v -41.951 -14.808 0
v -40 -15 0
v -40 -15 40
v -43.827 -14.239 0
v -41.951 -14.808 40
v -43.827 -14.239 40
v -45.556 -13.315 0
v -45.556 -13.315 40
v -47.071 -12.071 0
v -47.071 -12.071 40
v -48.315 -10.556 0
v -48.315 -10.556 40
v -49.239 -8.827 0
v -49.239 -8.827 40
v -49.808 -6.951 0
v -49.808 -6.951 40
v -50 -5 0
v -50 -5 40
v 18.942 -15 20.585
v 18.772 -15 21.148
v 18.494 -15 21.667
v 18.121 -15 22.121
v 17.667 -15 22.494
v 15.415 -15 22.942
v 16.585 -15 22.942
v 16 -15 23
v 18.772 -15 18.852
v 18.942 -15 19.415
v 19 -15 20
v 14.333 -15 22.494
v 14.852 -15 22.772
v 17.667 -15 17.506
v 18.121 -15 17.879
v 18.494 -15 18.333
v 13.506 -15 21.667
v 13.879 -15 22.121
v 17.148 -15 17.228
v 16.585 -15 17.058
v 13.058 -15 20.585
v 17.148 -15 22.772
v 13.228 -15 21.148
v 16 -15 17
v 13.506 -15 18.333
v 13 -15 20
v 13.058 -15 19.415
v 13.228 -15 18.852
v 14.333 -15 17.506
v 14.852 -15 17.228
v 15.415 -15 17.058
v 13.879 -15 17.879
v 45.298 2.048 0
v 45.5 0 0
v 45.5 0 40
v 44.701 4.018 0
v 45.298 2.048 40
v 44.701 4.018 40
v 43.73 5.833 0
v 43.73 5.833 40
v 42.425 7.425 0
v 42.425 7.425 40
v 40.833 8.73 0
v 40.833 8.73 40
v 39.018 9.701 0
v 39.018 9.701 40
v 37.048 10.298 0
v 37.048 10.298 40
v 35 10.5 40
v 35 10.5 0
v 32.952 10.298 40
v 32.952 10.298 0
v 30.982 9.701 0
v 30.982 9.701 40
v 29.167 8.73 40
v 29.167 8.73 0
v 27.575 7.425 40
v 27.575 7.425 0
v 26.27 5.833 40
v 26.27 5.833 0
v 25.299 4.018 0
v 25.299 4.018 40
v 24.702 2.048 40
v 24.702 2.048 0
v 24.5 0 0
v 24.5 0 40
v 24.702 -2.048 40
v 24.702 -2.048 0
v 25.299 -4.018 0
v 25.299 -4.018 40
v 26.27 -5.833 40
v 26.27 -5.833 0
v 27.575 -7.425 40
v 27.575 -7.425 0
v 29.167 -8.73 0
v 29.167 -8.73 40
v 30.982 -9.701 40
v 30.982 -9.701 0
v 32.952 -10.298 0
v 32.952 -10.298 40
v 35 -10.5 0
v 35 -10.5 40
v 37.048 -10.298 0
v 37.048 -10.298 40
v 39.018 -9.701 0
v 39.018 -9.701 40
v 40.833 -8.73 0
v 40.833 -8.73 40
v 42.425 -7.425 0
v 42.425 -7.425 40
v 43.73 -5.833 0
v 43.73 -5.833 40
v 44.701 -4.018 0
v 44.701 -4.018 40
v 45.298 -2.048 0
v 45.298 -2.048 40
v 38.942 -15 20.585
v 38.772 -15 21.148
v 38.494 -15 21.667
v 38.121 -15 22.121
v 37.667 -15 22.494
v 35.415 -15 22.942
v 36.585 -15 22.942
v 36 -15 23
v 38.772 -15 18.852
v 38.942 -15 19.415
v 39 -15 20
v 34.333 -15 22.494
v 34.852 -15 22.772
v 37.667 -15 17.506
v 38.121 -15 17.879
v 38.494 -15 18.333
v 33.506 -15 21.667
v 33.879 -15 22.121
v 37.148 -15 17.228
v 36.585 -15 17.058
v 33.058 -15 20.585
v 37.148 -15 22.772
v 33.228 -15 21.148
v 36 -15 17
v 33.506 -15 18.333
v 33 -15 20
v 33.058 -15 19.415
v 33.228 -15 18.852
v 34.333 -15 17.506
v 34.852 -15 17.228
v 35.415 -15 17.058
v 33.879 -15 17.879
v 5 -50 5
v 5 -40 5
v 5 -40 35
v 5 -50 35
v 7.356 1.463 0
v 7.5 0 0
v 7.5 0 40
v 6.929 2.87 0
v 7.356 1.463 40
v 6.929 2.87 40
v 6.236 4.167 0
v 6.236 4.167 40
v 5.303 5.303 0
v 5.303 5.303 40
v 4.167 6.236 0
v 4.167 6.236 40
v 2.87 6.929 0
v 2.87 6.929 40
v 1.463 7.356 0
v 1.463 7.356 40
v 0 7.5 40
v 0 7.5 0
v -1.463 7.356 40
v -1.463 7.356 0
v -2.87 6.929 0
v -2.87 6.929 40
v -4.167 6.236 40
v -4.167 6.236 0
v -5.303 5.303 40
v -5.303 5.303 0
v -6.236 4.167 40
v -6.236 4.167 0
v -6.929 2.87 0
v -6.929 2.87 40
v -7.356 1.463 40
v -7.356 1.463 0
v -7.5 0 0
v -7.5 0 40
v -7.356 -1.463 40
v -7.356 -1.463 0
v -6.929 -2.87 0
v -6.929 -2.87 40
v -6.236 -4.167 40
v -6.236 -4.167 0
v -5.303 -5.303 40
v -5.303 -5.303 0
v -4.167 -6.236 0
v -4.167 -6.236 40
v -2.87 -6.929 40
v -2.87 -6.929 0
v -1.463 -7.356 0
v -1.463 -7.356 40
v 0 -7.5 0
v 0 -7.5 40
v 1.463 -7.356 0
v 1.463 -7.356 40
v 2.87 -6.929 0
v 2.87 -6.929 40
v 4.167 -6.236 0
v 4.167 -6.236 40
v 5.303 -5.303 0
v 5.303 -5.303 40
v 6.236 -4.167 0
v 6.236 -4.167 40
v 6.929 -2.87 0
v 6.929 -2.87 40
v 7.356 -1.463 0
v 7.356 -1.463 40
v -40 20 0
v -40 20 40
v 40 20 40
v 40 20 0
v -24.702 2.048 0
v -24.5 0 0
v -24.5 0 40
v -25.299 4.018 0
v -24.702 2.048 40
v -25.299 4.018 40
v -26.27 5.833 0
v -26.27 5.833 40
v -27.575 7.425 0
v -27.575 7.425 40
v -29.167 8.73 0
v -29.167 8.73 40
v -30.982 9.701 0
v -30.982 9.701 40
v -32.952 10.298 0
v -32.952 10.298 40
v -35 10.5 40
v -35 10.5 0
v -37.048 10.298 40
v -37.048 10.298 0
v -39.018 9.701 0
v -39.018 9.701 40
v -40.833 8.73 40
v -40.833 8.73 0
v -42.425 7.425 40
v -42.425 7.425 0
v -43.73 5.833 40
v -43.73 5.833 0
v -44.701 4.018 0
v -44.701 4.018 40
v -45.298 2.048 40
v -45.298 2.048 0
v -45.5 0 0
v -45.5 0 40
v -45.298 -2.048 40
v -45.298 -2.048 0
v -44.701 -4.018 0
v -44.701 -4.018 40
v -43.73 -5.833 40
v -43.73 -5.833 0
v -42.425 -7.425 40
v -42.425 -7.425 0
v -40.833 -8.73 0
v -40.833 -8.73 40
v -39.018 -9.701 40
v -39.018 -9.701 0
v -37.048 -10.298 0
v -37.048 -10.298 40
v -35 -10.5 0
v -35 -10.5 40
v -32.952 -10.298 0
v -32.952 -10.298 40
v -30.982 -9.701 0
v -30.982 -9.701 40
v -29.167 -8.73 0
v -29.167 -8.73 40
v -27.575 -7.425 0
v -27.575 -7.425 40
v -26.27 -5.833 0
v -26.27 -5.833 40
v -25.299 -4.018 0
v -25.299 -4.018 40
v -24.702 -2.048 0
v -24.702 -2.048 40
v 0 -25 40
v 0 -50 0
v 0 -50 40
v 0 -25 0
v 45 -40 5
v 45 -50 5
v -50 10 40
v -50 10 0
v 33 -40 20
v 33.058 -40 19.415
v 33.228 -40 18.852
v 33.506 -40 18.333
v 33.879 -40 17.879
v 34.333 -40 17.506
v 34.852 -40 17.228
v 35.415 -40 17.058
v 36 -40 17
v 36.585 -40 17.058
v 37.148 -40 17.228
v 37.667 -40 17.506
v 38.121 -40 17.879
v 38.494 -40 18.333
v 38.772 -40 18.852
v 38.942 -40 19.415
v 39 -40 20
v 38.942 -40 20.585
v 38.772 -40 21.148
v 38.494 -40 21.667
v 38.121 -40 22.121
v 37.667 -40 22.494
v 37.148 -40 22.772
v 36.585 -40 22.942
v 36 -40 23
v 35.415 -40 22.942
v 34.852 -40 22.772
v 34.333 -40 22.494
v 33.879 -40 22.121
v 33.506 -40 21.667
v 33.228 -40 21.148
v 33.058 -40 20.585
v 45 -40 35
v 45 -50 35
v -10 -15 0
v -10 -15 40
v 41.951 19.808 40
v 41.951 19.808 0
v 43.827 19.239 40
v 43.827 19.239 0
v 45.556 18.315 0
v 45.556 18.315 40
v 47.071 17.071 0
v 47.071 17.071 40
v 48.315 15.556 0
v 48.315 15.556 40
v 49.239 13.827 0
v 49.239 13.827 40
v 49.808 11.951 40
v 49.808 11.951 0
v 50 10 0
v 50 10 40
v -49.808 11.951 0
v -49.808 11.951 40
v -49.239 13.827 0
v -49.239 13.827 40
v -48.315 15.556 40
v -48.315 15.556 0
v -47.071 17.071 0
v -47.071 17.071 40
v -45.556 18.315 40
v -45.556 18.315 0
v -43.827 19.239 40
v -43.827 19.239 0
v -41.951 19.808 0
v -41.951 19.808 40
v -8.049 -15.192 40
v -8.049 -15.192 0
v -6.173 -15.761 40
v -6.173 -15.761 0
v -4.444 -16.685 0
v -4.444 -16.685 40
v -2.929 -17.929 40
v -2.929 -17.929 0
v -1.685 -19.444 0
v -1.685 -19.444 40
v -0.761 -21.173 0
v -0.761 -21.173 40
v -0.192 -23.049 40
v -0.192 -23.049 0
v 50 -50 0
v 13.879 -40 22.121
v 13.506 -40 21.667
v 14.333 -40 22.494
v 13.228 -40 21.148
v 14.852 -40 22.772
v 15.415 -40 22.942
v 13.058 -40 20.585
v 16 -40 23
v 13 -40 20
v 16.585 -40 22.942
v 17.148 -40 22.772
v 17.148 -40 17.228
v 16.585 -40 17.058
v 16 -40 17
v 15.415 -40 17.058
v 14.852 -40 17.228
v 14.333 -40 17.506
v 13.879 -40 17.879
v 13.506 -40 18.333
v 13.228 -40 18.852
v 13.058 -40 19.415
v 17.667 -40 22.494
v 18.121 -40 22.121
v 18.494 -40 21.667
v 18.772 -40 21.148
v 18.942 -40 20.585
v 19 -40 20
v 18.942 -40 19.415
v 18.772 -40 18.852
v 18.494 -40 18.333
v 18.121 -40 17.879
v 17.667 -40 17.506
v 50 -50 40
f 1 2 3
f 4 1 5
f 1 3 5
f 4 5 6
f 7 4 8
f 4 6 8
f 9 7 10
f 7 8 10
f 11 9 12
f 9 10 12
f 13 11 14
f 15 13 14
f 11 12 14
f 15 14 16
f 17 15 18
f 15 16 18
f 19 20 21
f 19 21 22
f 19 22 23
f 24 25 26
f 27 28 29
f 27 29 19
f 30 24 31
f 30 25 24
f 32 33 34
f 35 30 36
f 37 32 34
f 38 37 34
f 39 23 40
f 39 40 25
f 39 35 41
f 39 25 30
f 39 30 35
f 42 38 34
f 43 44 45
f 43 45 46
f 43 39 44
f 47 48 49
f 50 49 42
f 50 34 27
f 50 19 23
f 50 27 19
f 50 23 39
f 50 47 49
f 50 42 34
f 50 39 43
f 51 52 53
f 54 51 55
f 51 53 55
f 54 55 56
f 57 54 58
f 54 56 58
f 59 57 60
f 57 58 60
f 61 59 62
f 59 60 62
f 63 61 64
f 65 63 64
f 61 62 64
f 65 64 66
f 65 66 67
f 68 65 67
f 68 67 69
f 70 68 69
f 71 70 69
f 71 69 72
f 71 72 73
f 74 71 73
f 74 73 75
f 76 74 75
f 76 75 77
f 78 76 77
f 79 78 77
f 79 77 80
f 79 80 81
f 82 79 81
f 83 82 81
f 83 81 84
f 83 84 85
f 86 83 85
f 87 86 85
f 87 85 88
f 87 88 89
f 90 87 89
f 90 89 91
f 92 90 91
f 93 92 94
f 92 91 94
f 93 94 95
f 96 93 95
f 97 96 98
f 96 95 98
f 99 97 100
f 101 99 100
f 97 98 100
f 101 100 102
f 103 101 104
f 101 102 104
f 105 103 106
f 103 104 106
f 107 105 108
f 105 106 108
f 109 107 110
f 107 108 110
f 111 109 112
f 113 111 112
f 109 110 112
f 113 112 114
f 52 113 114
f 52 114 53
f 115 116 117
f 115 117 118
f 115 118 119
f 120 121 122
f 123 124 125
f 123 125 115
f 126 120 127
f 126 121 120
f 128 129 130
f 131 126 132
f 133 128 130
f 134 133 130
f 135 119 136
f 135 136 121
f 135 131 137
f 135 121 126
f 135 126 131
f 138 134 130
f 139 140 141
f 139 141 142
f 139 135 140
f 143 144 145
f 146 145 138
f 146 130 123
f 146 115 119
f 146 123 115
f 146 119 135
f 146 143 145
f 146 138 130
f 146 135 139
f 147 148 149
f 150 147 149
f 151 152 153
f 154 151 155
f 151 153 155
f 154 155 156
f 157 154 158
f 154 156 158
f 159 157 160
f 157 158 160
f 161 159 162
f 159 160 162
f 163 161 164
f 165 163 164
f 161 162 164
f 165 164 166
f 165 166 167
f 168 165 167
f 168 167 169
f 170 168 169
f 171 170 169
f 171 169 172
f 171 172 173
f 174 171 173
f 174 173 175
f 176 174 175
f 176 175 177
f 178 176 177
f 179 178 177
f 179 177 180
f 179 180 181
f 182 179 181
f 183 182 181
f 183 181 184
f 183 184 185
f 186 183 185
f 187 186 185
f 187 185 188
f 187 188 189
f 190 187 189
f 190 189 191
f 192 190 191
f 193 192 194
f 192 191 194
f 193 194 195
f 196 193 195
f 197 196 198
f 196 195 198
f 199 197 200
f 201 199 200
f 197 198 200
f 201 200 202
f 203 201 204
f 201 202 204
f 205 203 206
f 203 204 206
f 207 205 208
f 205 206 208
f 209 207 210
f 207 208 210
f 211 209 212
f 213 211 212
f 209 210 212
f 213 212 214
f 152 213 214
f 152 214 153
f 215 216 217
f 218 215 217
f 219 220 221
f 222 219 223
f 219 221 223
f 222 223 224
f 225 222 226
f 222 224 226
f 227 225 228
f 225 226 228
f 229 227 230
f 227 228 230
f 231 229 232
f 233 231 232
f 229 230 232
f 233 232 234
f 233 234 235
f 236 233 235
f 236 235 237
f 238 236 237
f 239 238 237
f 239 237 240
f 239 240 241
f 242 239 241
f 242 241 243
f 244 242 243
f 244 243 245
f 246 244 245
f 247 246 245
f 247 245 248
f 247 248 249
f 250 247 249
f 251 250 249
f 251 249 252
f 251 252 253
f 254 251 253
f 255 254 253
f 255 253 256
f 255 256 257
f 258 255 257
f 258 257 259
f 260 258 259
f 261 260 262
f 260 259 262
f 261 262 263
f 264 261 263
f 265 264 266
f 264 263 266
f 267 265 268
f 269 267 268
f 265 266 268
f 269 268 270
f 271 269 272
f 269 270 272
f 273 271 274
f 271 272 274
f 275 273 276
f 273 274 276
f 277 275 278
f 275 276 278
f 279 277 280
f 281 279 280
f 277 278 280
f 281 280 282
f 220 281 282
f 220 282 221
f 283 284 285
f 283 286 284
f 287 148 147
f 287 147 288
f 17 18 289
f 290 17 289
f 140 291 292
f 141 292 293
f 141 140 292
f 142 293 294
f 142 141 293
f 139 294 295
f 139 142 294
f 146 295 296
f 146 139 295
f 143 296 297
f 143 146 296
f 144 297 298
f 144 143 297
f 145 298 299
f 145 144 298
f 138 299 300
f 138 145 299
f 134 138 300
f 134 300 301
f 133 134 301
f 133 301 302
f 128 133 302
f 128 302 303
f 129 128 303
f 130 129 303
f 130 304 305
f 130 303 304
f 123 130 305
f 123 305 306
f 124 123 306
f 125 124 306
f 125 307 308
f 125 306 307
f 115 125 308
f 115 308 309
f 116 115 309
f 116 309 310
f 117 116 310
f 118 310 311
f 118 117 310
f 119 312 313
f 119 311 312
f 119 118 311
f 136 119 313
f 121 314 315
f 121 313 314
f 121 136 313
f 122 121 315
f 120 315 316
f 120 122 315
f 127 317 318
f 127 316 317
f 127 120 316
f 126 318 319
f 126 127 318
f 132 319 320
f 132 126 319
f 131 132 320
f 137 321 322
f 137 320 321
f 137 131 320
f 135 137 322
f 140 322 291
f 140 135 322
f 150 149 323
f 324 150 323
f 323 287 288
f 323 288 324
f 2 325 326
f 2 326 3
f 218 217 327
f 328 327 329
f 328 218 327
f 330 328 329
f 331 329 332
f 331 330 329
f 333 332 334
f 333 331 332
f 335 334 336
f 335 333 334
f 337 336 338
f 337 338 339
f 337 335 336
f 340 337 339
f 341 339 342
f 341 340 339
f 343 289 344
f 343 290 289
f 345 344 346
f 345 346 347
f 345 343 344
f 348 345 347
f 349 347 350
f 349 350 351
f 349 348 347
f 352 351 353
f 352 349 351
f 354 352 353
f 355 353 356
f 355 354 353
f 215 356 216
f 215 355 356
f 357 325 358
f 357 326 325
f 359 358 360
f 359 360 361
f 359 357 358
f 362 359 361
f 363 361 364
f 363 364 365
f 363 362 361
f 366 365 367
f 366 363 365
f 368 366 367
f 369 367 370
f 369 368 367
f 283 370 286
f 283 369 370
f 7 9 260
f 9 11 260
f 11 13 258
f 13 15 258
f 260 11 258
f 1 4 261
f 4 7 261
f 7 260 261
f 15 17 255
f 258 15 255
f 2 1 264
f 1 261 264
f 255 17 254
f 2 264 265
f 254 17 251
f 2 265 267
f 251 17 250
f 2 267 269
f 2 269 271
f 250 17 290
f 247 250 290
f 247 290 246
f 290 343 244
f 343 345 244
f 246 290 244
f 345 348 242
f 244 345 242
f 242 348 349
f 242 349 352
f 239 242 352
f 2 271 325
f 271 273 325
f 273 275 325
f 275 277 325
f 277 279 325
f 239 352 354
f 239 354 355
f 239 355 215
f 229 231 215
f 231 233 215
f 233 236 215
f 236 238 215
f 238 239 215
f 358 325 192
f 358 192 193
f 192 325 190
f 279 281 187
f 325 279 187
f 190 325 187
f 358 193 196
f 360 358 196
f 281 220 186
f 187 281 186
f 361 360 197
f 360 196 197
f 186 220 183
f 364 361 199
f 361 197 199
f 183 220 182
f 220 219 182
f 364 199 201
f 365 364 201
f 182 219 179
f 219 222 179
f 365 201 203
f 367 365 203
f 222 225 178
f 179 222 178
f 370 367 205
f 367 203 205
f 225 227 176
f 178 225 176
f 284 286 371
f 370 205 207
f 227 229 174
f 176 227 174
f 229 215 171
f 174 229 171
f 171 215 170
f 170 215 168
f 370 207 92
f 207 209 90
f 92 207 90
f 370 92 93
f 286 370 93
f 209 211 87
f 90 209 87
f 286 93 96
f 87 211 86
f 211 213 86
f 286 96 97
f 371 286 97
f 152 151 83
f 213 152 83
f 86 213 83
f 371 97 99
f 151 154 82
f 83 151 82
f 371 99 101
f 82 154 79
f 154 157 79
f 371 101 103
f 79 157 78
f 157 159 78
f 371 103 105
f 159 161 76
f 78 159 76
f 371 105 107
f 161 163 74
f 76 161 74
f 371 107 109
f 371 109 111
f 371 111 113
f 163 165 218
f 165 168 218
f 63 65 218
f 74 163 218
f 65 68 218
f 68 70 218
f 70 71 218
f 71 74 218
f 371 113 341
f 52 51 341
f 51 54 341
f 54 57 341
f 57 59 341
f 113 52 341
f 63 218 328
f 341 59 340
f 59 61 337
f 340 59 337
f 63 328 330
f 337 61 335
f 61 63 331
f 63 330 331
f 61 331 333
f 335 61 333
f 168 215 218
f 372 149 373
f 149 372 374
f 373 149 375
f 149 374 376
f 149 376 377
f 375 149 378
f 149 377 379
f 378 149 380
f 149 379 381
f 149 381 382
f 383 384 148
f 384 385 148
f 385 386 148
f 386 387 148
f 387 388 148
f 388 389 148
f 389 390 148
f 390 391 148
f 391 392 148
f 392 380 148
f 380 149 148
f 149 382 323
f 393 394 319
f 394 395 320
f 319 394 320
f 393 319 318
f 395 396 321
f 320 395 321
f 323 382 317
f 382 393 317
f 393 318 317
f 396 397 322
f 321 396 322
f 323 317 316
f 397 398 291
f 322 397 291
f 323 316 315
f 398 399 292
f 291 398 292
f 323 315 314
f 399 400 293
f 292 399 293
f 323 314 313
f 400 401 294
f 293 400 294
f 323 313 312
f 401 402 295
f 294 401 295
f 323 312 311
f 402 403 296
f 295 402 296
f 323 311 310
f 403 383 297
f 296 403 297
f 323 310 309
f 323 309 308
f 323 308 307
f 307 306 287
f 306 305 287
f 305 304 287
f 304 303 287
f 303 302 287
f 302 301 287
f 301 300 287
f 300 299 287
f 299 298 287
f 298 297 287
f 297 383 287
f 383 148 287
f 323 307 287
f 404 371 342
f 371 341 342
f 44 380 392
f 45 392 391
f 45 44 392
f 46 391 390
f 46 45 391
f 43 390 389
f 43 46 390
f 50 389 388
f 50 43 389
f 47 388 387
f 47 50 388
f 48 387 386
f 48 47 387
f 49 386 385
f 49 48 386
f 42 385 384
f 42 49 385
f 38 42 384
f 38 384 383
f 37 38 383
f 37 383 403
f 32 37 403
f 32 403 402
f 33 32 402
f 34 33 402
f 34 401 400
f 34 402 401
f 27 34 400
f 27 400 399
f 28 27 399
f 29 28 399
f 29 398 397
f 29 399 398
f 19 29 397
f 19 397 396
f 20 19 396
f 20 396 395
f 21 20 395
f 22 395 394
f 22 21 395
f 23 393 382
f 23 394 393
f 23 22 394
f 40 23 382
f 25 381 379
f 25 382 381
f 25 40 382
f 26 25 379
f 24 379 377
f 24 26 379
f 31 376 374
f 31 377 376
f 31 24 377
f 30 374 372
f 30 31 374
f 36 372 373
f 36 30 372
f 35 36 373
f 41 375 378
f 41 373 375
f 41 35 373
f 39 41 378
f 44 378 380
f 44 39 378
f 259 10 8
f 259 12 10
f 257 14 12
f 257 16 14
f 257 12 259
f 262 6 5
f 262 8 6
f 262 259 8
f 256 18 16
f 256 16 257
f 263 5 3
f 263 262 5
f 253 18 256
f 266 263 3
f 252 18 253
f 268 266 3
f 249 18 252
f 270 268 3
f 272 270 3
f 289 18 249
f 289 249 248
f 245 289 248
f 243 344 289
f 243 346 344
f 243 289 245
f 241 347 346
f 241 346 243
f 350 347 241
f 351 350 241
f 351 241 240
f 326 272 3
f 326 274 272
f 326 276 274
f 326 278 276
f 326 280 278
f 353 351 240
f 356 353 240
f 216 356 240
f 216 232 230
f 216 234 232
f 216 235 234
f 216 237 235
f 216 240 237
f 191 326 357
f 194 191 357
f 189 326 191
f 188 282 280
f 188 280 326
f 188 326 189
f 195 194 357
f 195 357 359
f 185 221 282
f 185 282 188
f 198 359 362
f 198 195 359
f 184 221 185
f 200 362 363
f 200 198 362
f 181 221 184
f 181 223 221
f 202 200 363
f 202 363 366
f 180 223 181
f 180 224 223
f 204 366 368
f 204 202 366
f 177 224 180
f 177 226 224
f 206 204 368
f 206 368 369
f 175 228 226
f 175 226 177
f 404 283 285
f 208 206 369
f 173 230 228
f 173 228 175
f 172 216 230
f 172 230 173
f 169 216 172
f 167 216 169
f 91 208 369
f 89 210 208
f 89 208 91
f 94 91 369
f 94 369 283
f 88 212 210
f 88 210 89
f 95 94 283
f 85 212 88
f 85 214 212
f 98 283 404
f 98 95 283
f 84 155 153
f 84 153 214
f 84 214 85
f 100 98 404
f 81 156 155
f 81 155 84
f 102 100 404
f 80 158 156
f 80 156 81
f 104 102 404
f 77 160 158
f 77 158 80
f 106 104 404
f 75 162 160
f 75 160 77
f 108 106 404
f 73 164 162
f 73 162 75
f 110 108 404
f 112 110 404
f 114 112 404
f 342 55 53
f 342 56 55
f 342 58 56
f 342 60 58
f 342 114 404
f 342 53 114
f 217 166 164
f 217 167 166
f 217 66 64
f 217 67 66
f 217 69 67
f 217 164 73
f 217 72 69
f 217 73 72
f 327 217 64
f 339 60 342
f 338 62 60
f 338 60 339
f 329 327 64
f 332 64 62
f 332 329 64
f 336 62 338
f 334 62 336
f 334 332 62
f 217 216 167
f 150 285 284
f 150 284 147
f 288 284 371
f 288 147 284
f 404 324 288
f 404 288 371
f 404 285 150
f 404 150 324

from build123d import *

# Parameters (mm, degrees)
SKETCH1_W               = 100
SKETCH1_H               = 80
BOSS_EXTRUDE1_DEPTH     = 40
CUT_EXTRUDE1_REACH      = 77.498
SKETCH2_R               = 7.5
SKETCH2_R_2             = 10.5
CUT_EXTRUDE2_REACH      = 77.498
SKETCH3_W               = 100
SKETCH3_H               = 20
CUT_EXTRUDE3_DEPTH      = 50
CUT_EXTRUDE3_DEPTH_BACK = 25
SKETCH4_R               = 3
CUT_EXTRUDE4_REACH      = 77.498
SKETCH5_W               = 50
SKETCH5_H               = 25
FILLET1_R               = 10
FILLET2_R               = 10
FILLET3_R               = 10
FILLET4_R               = 10
SKETCH6_W               = 50
SKETCH6_H               = 40
SKETCH6_W_2             = 40
SKETCH6_H_2             = 30
BOSS_EXTRUDE2_DEPTH     = 10


with BuildPart() as part:
    # Sketch1 → Boss-Extrude1 (new body)
    with BuildSketch(Plane.XY):
        Rectangle(SKETCH1_W, SKETCH1_H)
    extrude(amount=BOSS_EXTRUDE1_DEPTH)

    # Sketch2 → Cut-Extrude1 (cut, up to next)
    with BuildSketch(Plane.XY.offset(40), mode=Mode.PRIVATE) as cut_extrude1_sk1:
        Circle(SKETCH2_R)
    cut_extrude1_tool1 = extrude(cut_extrude1_sk1.sketch, amount=-CUT_EXTRUDE1_REACH, mode=Mode.PRIVATE) & part.part
    # Sketch2 → Cut-Extrude1 (cut, up to next)
    with BuildSketch(Plane.XY.offset(40), mode=Mode.PRIVATE) as cut_extrude1_sk2:
        with Locations((-35, 0)):
            Circle(SKETCH2_R_2)
    cut_extrude1_tool2 = extrude(cut_extrude1_sk2.sketch, amount=-CUT_EXTRUDE1_REACH, mode=Mode.PRIVATE) & part.part
    # Sketch2 → Cut-Extrude1 (cut, up to next)
    with BuildSketch(Plane.XY.offset(40), mode=Mode.PRIVATE) as cut_extrude1_sk3:
        with Locations((35, 0)):
            Circle(SKETCH2_R_2)
    cut_extrude1_tool3 = extrude(cut_extrude1_sk3.sketch, amount=-CUT_EXTRUDE1_REACH, mode=Mode.PRIVATE) & part.part
    add(cut_extrude1_tool1.solids().sort_by_distance((0, 0, 40))[0], mode=Mode.SUBTRACT)
    add(cut_extrude1_tool2.solids().sort_by_distance((-35, 0, 40))[0], mode=Mode.SUBTRACT)
    add(cut_extrude1_tool3.solids().sort_by_distance((35, 0, 40))[0], mode=Mode.SUBTRACT)

    # Sketch3 → Cut-Extrude2 (cut, up to next)
    with BuildSketch(Plane.XY.offset(40), mode=Mode.PRIVATE) as cut_extrude2_sk1:
        with Locations((0, 30)):
            Rectangle(SKETCH3_W, SKETCH3_H)
    cut_extrude2_tool1 = extrude(cut_extrude2_sk1.sketch, amount=-CUT_EXTRUDE2_REACH, mode=Mode.PRIVATE) & part.part
    add(cut_extrude2_tool1.solids().sort_by_distance((0, 30, 40))[0], mode=Mode.SUBTRACT)

    # Sketch4 → Cut-Extrude3 (cut, two sides: drawn at the far end of the back side and taken through both)
    with BuildSketch(Plane.XZ.offset(40).offset(-CUT_EXTRUDE3_DEPTH_BACK)):
        with Locations(Location((16, 20, 0), (0, 0, 180))):
            Circle(SKETCH4_R)
        with Locations(Location((36, 20, 0), (0, 0, 180))):
            Circle(SKETCH4_R)
    extrude(amount=CUT_EXTRUDE3_DEPTH + CUT_EXTRUDE3_DEPTH_BACK, mode=Mode.SUBTRACT)

    # Sketch5 → Cut-Extrude4 (cut, up to next)
    with BuildSketch(Plane(origin=(0, 0, 0), x_dir=(-1, 0, 0), z_dir=(0, 0, -1)), mode=Mode.PRIVATE) as cut_extrude4_sk1:
        with Locations((25, -27.5)):
            Rectangle(SKETCH5_W, SKETCH5_H)
    cut_extrude4_tool1 = extrude(cut_extrude4_sk1.sketch, amount=-CUT_EXTRUDE4_REACH, mode=Mode.PRIVATE) & part.part
    add(cut_extrude4_tool1.solids().sort_by_distance((-25, -27.5, 0))[0], mode=Mode.SUBTRACT)

    # Fillet1
    fillet1_edges = [part.edges().sort_by_distance(p)[0] for p in [
        (0, -15, 20),
    ]]
    fillet(fillet1_edges, radius=FILLET1_R)

    # Fillet2
    fillet2_edges = [part.edges().sort_by_distance(p)[0] for p in [
        (-50, -15, 20),
    ]]
    fillet(fillet2_edges, radius=FILLET2_R)

    # Fillet3
    fillet3_edges = [part.edges().sort_by_distance(p)[0] for p in [
        (-50, 20, 20),
    ]]
    fillet(fillet3_edges, radius=FILLET3_R)

    # Fillet4
    fillet4_edges = [part.edges().sort_by_distance(p)[0] for p in [
        (50, 20, 20),
    ]]
    fillet(fillet4_edges, radius=FILLET4_R)

    # Sketch6 → Boss-Extrude2 (add)
    with BuildSketch(Plane.XZ.offset(40)):
        with Locations((25, 20)):
            Rectangle(SKETCH6_W, SKETCH6_H)
        with Locations((25, 20)):
            Rectangle(SKETCH6_W_2, SKETCH6_H_2, mode=Mode.SUBTRACT)
    extrude(amount=BOSS_EXTRUDE2_DEPTH)


solid = part.part
